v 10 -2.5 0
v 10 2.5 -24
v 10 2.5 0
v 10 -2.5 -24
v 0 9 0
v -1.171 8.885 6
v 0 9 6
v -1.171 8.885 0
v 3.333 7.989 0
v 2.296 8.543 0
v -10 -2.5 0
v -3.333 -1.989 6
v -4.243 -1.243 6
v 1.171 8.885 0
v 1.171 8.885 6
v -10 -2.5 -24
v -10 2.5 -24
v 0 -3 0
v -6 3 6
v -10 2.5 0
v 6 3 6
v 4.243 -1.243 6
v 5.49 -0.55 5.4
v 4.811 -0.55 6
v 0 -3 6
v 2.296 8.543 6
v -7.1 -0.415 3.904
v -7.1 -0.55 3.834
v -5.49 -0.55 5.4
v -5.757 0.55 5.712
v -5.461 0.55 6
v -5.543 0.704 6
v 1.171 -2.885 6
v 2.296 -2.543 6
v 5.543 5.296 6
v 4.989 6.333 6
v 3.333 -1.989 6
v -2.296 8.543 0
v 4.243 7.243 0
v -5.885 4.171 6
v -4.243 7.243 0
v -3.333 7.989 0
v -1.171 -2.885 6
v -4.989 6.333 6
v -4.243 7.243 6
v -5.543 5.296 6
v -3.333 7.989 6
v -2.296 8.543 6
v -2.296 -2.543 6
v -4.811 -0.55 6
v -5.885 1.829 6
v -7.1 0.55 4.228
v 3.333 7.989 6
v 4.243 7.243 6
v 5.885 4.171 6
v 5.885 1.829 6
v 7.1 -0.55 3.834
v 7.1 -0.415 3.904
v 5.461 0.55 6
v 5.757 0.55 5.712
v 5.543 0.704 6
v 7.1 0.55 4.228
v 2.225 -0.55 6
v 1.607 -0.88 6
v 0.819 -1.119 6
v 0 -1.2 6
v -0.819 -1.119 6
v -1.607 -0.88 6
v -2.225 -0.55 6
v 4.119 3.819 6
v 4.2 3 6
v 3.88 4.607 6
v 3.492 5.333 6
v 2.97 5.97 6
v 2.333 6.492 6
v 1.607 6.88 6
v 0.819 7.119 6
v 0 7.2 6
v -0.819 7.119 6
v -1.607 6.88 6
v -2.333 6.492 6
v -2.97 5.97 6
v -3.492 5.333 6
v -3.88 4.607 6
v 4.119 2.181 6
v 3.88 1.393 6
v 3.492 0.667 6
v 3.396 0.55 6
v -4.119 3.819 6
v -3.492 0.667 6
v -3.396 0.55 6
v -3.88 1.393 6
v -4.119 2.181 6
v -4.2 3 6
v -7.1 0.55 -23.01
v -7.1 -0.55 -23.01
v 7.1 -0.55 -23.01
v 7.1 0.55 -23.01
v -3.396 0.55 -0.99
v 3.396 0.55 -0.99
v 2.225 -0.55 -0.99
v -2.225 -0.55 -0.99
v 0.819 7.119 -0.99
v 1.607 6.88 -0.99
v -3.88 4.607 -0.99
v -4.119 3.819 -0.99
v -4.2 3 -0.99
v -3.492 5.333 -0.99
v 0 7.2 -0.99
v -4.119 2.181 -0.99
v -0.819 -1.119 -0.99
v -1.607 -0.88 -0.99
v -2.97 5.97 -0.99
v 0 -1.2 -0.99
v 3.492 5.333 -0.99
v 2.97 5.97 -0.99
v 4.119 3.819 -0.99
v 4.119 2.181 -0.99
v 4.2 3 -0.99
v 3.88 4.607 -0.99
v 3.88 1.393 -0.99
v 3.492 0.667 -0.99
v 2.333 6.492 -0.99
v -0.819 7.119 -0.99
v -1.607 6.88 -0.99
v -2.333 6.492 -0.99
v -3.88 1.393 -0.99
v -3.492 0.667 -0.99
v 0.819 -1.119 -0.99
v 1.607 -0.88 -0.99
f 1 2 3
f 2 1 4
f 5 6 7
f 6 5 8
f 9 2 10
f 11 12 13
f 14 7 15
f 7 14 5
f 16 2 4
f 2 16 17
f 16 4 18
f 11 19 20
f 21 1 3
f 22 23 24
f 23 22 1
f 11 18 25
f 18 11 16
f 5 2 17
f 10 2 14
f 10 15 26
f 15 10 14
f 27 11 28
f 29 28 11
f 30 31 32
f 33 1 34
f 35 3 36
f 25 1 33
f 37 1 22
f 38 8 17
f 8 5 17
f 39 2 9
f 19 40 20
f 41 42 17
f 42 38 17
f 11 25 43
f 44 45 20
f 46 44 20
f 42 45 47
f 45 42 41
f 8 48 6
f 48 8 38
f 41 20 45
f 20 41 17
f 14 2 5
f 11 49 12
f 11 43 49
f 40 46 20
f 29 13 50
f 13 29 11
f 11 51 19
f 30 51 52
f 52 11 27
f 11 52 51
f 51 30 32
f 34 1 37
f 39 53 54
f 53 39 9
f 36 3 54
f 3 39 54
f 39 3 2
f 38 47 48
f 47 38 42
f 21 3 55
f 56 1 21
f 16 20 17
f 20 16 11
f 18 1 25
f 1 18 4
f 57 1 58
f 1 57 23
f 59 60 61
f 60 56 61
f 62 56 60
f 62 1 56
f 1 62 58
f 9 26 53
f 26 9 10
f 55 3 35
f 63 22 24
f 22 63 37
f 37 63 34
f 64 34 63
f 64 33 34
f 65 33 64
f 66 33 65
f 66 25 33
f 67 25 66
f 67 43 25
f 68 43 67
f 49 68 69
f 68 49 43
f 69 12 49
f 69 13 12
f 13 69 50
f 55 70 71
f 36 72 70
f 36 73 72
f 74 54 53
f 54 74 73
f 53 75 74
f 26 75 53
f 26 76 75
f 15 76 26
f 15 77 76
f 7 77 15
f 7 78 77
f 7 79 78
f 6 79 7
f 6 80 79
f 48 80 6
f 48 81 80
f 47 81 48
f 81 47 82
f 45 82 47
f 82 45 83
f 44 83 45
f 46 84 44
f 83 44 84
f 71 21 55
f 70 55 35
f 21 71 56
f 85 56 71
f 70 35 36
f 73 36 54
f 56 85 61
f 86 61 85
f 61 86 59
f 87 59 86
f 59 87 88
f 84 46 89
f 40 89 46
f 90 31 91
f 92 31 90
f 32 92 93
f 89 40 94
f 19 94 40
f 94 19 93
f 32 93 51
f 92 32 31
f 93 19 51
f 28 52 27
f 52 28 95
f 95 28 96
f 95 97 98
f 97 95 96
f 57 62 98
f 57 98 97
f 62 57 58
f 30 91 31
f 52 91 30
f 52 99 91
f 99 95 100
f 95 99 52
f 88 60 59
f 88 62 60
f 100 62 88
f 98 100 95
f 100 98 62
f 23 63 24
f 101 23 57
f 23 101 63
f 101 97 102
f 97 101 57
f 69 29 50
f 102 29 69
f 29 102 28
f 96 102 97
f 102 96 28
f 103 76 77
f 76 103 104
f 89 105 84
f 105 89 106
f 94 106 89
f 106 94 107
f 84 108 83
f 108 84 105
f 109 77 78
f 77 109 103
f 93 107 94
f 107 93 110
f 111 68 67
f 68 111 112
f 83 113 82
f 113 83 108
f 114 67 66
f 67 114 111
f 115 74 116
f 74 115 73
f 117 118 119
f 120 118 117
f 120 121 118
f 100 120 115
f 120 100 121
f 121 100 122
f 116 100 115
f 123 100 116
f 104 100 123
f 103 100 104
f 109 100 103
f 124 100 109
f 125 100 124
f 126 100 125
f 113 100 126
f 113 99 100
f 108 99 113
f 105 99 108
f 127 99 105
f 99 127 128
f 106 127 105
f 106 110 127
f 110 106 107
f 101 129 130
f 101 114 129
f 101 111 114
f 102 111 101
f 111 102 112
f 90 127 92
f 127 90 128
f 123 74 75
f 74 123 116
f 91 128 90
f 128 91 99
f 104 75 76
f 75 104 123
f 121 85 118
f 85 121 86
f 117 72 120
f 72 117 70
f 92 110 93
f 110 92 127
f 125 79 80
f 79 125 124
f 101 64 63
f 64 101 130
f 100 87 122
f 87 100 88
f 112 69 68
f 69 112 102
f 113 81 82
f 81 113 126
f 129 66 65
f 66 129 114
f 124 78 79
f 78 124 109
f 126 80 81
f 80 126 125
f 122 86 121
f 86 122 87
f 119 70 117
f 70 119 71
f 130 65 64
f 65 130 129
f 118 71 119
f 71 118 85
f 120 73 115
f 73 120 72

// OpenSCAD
$fn=32;
EPS=0.01;

MetalZ=24;
hCyl=6;
rCyl=6;


rotate(180,[0,1,0]) difference() {
    hull() {
        translate([0,0,MetalZ/2]) cube(center=true, size=[20,5,MetalZ]);
        translate([0,rCyl-3,-hCyl]) cylinder(r=rCyl,h=hCyl);
    }
    translate([0,0,MetalZ/2-hCyl+EPS]) cube(center=true, size=[14.2,1.1,MetalZ+hCyl+4]);
    translate([0,rCyl-3,-hCyl-EPS]) cylinder(r=4.2,h=hCyl+1);
}
